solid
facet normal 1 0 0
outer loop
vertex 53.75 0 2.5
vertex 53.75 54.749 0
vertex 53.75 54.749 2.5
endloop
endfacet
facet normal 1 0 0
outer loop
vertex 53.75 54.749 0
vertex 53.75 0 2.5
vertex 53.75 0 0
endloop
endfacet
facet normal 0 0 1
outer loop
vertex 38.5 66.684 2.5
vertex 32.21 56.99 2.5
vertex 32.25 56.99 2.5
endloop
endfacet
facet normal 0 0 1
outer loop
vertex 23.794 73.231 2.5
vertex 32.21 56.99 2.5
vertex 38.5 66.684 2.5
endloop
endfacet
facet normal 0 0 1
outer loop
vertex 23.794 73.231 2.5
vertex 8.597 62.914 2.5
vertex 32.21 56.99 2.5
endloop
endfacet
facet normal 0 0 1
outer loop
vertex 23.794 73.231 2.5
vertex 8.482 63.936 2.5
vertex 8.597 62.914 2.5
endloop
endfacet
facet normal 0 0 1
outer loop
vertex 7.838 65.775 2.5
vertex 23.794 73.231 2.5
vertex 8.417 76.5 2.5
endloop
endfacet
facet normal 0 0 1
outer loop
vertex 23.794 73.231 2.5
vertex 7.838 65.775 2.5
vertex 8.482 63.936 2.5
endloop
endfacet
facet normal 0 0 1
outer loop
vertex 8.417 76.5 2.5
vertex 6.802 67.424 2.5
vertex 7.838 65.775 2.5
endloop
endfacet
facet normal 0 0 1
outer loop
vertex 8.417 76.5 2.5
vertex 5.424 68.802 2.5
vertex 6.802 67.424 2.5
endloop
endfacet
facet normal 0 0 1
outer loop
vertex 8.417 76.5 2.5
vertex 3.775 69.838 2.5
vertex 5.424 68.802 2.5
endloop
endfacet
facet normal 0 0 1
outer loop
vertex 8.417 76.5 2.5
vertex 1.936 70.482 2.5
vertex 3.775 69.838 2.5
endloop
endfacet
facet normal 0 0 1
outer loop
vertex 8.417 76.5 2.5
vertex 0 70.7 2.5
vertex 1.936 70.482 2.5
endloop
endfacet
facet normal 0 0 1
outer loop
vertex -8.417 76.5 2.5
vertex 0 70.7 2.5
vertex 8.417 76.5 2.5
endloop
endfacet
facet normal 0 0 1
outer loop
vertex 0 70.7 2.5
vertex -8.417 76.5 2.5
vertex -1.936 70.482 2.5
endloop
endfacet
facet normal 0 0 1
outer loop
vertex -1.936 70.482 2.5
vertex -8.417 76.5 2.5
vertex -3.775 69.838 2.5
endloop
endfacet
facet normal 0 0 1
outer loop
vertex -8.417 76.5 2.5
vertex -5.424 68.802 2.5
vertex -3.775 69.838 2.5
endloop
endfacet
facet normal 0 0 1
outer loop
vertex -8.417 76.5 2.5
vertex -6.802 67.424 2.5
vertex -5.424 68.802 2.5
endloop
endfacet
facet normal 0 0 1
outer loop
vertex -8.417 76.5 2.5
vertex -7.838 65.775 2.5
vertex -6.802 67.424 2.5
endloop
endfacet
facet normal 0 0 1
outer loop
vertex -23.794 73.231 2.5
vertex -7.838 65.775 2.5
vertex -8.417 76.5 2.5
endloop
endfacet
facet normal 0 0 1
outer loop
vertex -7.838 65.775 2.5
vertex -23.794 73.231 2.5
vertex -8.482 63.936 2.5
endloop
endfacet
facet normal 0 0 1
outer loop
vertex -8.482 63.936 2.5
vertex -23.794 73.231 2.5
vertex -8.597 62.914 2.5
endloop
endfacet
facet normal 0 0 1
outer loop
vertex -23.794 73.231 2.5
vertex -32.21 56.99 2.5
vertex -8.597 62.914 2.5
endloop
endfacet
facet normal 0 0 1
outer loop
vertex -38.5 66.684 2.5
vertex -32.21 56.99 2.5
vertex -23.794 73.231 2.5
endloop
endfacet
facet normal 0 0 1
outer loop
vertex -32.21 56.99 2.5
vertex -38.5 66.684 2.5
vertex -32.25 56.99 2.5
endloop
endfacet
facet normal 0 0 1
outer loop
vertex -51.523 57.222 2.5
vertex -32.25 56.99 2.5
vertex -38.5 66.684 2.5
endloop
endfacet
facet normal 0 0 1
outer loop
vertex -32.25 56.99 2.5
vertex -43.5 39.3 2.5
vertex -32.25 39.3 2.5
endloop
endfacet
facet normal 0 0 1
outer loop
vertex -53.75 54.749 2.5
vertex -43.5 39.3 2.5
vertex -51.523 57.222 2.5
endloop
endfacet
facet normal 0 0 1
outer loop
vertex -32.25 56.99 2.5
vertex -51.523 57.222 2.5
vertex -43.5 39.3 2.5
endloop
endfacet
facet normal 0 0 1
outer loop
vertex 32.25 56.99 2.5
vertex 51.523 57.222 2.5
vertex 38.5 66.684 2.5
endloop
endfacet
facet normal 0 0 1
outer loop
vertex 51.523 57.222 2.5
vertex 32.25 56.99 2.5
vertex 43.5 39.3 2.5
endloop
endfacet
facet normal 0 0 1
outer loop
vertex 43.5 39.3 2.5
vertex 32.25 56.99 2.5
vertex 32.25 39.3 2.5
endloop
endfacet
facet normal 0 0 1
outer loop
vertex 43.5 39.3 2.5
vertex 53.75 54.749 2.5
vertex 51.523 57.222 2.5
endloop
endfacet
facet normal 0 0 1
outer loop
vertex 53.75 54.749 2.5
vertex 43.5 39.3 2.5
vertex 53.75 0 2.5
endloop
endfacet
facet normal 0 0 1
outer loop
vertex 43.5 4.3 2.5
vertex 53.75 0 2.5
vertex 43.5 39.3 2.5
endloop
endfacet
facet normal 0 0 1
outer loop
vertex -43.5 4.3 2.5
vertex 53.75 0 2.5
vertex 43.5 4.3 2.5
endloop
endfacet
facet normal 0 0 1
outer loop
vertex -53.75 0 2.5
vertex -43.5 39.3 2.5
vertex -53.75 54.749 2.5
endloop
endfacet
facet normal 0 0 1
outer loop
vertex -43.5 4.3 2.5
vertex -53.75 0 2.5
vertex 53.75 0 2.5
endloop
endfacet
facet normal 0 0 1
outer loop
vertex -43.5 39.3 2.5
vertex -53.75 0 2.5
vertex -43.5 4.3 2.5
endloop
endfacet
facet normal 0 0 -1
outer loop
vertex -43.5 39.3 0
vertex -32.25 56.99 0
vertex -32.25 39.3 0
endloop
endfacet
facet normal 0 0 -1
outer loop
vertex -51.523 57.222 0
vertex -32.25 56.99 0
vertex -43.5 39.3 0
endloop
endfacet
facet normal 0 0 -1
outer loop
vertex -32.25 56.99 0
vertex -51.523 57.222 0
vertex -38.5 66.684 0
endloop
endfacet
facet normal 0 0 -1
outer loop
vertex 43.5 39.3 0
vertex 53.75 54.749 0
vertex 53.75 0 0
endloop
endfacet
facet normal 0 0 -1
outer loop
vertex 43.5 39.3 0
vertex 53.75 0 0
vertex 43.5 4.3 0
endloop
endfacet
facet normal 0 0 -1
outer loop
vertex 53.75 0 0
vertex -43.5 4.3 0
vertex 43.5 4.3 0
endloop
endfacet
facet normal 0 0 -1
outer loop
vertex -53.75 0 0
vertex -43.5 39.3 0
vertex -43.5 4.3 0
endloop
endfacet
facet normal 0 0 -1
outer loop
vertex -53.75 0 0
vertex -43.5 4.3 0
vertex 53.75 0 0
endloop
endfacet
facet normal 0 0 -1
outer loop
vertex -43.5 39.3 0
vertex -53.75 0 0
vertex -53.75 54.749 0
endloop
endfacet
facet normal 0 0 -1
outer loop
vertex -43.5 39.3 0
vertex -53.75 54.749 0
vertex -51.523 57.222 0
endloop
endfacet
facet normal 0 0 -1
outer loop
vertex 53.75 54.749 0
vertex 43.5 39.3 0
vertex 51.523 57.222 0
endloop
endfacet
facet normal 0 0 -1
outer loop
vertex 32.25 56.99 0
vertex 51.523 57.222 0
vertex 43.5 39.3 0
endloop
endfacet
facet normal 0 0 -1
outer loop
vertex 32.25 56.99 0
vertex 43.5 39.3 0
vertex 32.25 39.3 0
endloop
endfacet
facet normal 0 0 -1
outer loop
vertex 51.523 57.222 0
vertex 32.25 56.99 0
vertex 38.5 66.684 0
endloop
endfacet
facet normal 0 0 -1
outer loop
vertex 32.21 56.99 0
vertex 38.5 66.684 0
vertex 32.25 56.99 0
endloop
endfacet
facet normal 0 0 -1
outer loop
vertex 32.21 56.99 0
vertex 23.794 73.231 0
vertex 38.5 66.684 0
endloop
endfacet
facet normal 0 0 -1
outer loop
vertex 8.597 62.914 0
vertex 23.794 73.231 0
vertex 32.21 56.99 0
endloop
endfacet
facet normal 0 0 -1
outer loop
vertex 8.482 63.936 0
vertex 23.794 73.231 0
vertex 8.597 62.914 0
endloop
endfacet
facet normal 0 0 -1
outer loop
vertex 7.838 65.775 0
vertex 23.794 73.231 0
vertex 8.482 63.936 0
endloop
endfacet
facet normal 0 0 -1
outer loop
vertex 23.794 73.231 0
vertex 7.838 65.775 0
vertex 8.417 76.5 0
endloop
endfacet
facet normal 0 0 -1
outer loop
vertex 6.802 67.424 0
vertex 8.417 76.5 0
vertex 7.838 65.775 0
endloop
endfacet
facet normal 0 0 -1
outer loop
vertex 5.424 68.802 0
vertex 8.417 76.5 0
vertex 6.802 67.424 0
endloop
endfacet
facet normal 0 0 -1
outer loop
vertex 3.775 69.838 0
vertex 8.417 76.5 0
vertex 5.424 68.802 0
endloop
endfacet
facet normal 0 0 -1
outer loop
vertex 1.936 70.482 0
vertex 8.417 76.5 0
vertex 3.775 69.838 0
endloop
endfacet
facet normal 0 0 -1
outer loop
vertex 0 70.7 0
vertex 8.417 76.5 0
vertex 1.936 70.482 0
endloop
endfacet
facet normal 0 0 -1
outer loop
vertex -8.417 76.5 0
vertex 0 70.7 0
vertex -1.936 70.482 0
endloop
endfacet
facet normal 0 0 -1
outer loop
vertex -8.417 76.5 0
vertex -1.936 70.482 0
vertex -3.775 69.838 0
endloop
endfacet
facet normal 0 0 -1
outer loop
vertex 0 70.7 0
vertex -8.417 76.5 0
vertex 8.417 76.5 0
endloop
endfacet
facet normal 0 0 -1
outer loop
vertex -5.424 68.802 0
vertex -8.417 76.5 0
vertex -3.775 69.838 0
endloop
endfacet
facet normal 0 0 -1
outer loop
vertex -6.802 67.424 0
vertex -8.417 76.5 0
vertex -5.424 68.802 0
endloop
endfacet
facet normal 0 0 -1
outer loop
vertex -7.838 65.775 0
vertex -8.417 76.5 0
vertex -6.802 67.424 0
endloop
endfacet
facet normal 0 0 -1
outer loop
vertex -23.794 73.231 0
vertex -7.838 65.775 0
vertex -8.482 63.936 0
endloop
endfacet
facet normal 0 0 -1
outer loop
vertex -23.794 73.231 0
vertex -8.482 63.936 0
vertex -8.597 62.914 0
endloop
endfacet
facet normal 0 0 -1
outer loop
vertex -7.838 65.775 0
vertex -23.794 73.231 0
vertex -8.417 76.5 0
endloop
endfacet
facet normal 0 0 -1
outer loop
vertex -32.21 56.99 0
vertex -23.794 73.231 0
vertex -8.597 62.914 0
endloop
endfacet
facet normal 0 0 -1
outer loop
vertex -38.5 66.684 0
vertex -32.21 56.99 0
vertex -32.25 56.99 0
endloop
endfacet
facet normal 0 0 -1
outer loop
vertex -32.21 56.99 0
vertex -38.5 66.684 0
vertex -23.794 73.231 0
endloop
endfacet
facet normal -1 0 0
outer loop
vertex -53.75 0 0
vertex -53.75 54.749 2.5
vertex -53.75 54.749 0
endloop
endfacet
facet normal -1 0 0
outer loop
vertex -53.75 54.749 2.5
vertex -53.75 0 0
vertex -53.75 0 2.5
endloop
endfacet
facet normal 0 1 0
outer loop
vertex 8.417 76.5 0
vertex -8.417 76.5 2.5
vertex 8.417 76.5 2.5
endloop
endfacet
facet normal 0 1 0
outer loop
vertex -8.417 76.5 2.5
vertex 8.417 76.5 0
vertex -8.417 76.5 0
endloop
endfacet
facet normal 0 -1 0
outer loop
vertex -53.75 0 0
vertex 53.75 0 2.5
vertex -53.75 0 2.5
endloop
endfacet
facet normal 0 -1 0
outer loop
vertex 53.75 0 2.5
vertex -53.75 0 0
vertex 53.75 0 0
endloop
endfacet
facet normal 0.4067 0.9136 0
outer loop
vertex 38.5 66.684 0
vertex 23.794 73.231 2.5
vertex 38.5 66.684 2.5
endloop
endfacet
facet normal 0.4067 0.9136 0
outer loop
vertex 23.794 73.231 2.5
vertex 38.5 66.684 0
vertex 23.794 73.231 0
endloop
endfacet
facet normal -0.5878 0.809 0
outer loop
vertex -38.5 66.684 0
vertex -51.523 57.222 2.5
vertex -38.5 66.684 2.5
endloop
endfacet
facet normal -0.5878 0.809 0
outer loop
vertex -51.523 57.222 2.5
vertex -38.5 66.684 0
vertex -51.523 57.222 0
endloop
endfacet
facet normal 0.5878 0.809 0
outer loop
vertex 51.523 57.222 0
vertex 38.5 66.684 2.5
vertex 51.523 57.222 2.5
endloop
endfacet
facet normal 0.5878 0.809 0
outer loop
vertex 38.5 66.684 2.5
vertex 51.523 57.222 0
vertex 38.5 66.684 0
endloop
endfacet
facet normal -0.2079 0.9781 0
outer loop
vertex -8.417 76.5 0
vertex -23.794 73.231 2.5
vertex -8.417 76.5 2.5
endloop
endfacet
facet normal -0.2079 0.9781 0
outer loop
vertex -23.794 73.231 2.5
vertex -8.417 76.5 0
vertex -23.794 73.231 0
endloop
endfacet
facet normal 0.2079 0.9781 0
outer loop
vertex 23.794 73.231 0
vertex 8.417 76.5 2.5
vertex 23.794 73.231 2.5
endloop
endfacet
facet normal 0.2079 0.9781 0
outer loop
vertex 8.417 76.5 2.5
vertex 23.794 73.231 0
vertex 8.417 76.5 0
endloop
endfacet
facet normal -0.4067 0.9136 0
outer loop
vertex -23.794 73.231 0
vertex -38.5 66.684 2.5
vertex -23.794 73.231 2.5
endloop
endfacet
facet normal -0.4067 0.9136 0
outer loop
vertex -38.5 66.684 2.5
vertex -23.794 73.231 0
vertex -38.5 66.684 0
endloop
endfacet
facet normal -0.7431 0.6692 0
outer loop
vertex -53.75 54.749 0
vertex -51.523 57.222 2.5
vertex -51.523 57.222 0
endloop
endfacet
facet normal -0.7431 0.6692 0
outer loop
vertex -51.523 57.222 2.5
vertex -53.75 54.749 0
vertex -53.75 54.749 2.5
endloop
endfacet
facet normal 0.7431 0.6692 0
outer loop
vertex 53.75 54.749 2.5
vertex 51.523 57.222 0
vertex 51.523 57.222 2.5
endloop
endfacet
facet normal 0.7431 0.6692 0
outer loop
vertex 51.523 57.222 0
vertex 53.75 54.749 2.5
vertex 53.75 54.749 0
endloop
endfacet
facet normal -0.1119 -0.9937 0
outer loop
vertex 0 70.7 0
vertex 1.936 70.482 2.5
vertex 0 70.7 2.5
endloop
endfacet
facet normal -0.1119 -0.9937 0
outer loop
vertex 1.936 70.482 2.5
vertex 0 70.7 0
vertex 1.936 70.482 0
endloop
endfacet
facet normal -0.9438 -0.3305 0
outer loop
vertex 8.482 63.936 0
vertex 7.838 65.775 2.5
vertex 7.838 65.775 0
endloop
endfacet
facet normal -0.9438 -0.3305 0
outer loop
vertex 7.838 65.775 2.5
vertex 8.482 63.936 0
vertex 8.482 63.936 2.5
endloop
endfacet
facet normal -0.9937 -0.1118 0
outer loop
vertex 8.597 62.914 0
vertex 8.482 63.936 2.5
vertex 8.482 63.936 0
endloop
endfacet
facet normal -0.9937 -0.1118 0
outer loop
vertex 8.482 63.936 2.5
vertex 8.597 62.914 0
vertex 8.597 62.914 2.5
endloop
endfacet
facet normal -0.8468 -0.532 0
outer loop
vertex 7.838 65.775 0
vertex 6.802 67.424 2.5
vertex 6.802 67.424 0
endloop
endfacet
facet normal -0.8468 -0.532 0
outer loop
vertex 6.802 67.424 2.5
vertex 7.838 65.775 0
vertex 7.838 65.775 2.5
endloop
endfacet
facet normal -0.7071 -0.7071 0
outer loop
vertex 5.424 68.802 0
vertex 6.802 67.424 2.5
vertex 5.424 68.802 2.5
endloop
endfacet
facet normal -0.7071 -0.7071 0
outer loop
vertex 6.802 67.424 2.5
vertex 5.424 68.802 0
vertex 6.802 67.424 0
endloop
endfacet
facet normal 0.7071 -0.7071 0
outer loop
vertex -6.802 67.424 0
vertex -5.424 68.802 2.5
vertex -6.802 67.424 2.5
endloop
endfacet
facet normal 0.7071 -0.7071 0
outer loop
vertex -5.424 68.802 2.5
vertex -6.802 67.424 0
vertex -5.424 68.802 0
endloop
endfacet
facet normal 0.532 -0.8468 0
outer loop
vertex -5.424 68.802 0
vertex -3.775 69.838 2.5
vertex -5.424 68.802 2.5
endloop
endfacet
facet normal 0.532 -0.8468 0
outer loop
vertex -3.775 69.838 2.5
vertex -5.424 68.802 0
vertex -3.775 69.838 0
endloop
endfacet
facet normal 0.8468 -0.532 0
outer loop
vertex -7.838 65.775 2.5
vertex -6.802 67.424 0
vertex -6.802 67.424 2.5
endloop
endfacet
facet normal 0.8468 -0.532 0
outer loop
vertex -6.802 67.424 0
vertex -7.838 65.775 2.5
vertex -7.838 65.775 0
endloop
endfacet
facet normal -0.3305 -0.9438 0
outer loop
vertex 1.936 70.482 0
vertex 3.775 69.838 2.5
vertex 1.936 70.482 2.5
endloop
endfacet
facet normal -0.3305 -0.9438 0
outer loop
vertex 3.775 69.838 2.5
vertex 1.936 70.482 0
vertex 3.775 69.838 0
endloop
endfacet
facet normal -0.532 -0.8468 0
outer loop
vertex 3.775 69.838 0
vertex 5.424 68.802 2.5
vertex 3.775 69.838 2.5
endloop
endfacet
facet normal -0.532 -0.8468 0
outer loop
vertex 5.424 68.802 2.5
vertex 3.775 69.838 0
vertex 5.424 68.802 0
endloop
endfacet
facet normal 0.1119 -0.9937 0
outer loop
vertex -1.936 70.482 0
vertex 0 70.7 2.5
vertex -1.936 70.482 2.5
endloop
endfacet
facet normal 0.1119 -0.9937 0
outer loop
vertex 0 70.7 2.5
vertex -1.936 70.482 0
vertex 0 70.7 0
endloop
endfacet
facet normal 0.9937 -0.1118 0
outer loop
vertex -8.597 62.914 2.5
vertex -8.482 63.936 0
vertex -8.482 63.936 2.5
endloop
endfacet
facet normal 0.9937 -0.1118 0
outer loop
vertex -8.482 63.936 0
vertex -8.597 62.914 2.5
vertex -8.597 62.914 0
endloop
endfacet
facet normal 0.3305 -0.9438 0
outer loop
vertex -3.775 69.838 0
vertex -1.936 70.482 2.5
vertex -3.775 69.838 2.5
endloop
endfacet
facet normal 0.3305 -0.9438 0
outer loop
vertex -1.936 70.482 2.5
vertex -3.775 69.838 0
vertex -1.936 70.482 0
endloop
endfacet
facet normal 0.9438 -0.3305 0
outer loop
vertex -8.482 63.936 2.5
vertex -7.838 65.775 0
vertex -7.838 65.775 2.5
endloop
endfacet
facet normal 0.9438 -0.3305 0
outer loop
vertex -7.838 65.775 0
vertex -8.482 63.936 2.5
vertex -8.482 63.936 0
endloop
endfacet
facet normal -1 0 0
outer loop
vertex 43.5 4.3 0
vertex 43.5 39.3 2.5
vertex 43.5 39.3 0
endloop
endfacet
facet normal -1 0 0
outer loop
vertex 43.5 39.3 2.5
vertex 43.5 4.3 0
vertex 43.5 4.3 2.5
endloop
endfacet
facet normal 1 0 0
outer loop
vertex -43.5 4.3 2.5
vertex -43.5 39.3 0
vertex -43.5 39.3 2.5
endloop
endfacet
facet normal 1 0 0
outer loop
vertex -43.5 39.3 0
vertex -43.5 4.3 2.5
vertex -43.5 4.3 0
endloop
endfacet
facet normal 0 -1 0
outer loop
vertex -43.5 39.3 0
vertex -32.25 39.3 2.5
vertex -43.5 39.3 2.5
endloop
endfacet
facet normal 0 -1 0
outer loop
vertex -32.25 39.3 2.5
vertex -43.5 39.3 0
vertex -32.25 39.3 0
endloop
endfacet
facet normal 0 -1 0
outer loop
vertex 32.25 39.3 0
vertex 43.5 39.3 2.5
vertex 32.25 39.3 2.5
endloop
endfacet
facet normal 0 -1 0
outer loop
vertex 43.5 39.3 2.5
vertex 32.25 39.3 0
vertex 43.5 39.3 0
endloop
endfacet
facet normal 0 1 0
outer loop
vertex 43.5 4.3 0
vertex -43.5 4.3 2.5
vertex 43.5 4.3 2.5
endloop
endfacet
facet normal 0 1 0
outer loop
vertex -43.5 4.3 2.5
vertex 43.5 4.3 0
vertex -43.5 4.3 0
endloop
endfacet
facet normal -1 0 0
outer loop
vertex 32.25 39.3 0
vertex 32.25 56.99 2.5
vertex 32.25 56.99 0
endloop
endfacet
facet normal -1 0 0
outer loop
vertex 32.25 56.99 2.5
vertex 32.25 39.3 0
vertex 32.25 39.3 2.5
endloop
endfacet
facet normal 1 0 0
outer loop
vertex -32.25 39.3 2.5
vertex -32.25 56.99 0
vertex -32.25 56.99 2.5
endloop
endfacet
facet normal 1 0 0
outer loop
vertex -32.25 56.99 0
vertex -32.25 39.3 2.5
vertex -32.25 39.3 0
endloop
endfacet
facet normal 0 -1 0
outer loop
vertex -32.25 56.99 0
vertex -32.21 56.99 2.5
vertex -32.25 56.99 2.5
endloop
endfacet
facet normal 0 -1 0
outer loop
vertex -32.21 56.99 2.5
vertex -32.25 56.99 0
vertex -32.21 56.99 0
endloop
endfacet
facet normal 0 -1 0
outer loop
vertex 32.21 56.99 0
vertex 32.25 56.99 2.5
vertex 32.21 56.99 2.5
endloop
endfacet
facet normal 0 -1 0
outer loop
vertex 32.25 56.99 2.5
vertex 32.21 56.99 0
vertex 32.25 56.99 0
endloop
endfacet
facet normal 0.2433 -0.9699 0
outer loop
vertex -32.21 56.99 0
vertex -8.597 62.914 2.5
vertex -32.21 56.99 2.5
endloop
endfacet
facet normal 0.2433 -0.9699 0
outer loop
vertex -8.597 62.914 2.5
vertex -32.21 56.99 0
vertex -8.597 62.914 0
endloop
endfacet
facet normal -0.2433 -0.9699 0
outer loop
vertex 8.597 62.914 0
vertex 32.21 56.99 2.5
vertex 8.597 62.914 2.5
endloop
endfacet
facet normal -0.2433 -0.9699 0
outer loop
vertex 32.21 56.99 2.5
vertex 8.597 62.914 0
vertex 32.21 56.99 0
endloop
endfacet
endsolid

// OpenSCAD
// measures are in mm 
// copied and adapted from the blueprints of CS:R from R2 Builders Club

h = 2.5;

module triangle(l, w, h) {
	CubePoints = [
		[0, 0, 0], // 0
		[l, 0, 0], // 1
		[l, w, 0], // 2
		[0, 0, h], // 3
		[l, 0, h], // 4
		[l, w, h], // 5
	];

	CubeFaces = [
		[0, 1, 2], // bottom
		[0, 3, 4, 1], // front
		[5, 4, 3], // top
		[1, 4, 5, 2], // right
		[2, 5, 3, 0], // back, left
	]; // left

	polyhedron(CubePoints, CubeFaces);
}

module the_triangle() {
	translate([-64.5/2, 4.3+35+17.7-0.02, 0])
	triangle(64.5/2-8.7/2, 7, h);
}

module outer() {
	intersection() {
		translate([-107.5/2,0,0])
		cube(size=[107.5,76.5,h]);

		cylinder(h, 77, 77);
	}
}

module inner() {
	translate([0, 62, 0])
	cylinder(h, 8.7, 8.7);

	translate([-87/2, 4.3, 0])
	cube(size=[87, 35, h]);

	translate([-64.5/2, 4.3+35-0.01, 0])
	cube(size=[64.5, 17.7, h]);

	the_triangle();
	mirror([1, 0, 0])
	the_triangle();
}

module all() {
	difference() {
		outer();

		translate([0, 0, -h/2])
		scale([1, 1, 2])
		inner();
	}
}

all();
